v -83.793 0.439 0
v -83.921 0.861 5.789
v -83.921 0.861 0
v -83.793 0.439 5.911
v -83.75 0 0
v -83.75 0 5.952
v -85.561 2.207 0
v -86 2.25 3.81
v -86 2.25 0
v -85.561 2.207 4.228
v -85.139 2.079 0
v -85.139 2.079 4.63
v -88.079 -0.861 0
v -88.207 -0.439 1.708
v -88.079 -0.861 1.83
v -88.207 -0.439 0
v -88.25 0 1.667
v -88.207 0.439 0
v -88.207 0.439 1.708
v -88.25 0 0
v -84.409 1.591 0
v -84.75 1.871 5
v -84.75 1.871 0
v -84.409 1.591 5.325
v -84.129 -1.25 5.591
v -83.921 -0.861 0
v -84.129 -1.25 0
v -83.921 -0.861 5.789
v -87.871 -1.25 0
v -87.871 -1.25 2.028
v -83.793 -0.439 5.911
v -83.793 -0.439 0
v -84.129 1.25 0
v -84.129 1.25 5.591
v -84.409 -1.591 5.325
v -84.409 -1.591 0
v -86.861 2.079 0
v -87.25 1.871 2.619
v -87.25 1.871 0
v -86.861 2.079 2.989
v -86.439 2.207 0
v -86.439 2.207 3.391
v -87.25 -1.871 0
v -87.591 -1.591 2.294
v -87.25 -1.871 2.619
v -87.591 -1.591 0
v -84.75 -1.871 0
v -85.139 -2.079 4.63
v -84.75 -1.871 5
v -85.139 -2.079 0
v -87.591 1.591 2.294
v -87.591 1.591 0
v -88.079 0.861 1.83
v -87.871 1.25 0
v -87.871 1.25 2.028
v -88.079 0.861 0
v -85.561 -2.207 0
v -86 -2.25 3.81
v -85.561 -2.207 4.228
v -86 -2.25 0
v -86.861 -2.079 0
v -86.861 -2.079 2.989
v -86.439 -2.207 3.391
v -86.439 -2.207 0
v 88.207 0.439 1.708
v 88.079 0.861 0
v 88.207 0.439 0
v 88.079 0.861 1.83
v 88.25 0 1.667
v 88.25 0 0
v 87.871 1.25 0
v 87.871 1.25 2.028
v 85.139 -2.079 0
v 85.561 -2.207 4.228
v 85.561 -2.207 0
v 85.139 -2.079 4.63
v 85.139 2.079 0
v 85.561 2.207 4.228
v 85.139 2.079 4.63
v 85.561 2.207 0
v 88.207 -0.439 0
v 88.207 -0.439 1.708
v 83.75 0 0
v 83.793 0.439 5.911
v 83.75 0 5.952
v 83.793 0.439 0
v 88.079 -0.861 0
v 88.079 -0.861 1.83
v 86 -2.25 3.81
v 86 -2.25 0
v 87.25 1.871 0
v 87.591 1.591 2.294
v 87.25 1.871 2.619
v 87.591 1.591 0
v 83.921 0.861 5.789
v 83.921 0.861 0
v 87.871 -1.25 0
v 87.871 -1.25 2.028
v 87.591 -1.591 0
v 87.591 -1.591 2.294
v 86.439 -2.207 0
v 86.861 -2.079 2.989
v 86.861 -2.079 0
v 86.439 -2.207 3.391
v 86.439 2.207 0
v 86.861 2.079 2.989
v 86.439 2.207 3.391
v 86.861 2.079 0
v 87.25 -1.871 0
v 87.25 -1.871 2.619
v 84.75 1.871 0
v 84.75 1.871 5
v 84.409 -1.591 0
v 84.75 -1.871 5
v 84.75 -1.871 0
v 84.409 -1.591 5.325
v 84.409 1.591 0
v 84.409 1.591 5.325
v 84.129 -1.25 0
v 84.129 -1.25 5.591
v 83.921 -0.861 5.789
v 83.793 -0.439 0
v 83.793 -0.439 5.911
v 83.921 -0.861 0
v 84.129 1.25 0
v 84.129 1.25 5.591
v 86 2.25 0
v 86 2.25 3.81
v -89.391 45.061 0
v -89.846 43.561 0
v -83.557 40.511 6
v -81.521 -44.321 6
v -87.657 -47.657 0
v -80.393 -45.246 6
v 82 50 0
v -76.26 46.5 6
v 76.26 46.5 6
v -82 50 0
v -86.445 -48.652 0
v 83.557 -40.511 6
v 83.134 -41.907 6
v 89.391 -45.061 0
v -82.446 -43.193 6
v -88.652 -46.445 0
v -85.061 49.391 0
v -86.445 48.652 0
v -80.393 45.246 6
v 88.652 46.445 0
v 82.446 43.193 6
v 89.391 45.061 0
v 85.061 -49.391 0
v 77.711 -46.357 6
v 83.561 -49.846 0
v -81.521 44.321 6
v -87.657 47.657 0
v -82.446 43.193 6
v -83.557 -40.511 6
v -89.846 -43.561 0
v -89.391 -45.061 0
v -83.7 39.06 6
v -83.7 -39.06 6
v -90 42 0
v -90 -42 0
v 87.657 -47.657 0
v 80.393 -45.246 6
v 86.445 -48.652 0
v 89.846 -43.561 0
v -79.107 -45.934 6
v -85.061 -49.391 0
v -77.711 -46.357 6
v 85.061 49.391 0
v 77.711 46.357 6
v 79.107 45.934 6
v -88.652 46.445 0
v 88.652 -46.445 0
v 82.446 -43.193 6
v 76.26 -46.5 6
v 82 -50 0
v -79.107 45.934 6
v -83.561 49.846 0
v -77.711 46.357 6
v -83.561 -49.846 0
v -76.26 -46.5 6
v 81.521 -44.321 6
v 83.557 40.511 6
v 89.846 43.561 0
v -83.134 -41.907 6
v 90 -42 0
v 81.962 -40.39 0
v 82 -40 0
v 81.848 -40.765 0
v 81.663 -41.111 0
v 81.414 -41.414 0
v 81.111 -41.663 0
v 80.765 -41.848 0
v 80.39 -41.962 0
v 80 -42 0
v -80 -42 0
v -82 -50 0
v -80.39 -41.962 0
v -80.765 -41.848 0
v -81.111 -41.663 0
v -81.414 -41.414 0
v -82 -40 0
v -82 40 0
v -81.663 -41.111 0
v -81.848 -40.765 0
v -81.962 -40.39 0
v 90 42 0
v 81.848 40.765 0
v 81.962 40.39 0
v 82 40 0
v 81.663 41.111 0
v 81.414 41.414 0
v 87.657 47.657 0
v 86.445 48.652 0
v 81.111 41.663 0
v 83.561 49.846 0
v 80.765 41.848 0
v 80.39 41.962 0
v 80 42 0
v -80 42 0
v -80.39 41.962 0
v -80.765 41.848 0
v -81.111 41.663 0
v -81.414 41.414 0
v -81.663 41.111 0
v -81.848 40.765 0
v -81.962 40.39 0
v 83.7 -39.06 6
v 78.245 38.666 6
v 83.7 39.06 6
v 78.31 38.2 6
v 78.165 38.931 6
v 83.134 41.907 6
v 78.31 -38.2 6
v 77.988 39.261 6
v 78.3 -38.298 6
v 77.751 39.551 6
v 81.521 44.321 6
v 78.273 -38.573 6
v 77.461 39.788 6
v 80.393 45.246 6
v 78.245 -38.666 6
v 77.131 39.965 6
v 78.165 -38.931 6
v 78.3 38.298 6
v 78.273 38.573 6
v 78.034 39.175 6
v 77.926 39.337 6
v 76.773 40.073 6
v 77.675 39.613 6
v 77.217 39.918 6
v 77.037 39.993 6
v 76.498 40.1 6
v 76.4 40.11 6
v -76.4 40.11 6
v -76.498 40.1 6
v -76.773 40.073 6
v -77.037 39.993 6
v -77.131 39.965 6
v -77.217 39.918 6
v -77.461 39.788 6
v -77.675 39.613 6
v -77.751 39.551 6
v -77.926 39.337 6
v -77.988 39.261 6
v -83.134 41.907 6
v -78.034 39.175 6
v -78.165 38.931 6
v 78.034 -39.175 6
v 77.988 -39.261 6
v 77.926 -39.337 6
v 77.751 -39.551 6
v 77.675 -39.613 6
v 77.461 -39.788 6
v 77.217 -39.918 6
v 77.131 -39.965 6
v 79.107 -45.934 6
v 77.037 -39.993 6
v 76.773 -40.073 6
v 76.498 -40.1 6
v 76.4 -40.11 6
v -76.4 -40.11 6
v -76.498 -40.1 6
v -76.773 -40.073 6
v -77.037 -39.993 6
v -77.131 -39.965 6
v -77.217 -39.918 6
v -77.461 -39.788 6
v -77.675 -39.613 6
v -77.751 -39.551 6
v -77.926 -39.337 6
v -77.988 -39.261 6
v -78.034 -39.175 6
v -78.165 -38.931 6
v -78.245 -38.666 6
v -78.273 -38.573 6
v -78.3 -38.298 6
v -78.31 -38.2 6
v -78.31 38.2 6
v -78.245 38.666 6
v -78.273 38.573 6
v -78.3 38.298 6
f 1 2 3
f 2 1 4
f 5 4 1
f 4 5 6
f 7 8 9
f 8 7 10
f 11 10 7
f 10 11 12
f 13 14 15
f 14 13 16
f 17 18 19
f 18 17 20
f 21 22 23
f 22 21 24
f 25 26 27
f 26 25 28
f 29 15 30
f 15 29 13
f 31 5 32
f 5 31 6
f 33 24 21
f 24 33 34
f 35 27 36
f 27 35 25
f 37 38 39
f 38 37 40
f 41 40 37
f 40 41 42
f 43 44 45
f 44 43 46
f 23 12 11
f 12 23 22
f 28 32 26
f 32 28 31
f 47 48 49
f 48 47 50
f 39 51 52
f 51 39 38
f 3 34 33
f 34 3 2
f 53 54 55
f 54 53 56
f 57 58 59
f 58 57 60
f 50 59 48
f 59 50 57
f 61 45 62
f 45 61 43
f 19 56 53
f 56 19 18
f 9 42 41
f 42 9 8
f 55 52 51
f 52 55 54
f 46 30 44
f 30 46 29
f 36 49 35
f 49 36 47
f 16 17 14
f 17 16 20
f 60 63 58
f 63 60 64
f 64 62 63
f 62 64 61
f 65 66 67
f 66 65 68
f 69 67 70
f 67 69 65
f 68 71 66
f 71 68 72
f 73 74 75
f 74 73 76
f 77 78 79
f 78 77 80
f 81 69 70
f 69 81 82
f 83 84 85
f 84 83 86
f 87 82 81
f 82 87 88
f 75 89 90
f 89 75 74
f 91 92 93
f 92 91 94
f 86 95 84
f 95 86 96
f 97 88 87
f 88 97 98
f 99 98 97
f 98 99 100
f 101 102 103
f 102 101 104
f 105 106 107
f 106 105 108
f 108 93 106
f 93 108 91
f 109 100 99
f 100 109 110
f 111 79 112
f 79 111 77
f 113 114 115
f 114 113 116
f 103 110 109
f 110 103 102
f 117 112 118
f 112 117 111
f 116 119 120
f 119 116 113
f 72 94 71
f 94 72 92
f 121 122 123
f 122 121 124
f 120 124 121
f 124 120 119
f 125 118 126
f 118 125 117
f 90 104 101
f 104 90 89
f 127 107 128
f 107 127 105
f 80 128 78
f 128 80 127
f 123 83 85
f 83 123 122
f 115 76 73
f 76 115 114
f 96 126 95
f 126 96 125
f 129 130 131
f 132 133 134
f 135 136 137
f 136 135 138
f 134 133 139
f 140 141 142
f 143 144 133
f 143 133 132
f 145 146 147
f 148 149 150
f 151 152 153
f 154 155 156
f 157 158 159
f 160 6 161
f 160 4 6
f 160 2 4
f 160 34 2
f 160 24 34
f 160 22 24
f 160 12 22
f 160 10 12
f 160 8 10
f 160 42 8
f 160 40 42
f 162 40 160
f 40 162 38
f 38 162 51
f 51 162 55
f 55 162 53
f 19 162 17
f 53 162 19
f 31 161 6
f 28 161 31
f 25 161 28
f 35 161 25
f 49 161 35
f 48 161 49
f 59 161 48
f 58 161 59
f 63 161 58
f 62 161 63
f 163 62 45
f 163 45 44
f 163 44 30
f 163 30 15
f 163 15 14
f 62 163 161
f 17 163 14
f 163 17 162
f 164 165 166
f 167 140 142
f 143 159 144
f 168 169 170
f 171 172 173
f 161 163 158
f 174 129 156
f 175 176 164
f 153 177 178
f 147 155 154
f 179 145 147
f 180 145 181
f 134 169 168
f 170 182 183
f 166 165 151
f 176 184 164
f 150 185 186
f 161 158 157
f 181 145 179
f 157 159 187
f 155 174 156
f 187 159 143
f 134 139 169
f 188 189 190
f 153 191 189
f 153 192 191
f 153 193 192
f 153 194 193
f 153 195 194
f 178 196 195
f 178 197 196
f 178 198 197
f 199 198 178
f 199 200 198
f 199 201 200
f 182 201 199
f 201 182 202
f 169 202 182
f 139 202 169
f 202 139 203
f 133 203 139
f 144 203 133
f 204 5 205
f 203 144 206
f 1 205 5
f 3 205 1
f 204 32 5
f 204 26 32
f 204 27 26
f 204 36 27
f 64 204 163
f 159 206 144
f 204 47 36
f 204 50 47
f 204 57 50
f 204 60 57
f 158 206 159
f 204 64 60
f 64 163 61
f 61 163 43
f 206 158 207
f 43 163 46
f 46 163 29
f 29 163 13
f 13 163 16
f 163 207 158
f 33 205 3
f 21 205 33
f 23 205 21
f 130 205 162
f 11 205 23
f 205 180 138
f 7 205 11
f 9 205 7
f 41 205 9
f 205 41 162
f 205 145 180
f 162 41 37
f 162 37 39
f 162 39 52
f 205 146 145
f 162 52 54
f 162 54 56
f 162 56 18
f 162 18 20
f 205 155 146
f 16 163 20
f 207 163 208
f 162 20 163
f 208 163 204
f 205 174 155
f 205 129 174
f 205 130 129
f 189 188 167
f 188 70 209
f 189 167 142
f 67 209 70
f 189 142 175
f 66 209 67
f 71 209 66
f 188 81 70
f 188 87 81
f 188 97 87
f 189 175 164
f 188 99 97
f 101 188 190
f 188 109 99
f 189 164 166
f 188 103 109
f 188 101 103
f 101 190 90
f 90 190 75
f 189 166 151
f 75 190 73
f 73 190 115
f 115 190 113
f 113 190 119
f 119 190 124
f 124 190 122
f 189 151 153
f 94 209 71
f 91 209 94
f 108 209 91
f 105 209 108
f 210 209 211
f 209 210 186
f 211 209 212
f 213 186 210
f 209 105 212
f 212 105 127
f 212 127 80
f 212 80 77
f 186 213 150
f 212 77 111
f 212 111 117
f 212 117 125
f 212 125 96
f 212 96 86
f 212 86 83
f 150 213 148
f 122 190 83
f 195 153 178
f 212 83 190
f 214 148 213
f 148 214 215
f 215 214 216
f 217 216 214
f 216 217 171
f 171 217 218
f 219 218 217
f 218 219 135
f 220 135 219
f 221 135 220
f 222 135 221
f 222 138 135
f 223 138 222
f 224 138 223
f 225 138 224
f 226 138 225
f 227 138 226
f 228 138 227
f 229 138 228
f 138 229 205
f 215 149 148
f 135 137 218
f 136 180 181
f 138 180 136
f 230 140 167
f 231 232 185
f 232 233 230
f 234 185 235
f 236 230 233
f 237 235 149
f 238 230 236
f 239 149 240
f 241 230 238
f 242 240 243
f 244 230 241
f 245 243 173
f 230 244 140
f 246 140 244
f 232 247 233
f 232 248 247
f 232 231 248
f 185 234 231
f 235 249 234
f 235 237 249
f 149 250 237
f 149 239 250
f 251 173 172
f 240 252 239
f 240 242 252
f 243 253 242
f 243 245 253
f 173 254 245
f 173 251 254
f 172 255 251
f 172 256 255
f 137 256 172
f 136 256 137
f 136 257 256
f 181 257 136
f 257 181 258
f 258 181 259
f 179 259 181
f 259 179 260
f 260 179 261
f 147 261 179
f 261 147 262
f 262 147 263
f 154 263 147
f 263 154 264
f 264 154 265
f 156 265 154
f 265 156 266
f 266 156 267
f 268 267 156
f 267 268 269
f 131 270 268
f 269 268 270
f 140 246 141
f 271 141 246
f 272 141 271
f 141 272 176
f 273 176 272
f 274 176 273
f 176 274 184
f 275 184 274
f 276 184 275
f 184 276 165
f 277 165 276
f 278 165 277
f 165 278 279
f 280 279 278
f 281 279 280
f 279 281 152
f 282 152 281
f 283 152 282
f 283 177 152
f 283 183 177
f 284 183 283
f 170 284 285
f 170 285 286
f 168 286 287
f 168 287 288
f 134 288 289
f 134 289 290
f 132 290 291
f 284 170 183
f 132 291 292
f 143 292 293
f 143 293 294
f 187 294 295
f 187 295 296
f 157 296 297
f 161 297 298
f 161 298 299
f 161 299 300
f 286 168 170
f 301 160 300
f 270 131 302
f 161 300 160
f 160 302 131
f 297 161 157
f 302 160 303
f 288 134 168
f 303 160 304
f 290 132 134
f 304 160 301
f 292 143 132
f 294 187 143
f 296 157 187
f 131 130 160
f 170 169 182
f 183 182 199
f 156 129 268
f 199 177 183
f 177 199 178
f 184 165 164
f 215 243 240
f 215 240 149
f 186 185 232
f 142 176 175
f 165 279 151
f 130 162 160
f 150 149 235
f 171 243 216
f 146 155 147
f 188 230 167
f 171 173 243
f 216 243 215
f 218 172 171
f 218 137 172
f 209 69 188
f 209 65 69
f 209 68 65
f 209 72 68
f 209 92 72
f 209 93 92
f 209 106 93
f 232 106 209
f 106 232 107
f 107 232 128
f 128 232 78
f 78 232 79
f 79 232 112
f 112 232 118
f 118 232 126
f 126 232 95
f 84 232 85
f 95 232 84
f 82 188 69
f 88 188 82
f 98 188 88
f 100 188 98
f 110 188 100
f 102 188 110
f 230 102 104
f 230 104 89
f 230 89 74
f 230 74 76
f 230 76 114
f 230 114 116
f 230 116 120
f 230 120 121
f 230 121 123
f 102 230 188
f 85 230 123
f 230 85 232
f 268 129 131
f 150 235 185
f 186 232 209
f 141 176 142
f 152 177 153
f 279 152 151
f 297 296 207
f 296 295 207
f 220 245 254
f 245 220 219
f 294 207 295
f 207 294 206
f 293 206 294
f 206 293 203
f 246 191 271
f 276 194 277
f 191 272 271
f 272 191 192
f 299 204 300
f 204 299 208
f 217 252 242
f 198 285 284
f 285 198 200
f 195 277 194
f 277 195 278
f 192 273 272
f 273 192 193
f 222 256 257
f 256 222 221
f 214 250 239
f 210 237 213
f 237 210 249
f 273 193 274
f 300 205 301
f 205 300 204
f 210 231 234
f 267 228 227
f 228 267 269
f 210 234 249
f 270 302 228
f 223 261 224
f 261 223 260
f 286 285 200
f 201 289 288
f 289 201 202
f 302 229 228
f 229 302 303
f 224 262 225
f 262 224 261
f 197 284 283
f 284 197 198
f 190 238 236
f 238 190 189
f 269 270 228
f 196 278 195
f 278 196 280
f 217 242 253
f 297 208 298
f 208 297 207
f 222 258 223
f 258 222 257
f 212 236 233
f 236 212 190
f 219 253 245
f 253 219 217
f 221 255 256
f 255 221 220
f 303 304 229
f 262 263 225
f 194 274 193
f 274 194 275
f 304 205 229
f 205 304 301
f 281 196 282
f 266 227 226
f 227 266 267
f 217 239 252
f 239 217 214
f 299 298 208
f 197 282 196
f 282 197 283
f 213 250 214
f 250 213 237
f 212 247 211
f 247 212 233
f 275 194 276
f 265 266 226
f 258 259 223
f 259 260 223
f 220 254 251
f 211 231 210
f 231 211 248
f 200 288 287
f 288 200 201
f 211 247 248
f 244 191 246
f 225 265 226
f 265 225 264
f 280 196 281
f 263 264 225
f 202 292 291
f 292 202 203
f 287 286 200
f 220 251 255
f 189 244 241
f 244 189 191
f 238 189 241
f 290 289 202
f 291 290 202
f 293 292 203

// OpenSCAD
$fn = 32;

// ----------------------------------------------------------------------
// Display bezel: 180 x 100 mm frame, opening 164x84 mm
// ----------------------------------------------------------------------

// --- parameters (mm) ---
length = 180;             // frame outside length, X
width = 100;              // frame outside width, Y
frame_w = 8;              // frame width
thickness = 6;            // frame thickness
corner_r = 8;             // outside corner radius
chamfer = 0.93;           // outer wall taper
funnel = 0.94;            // inner opening taper
opening_l = 164;          // opening length
opening_w = 84;           // opening width
inner_r = 2;              // opening corner radius
hole_d = 4.5;             // mounting screw clearance
holes_per_side = 1;       // holes per short side
hole_inset = 4;           // hole centre inset from the outside edge

/* rounded-rectangle outlines, generated with loops */
module rounded_ring(l_nom, w_nom, r) {
  hull() {
    for (sx = [-1, 1]) for (sy = [-1, 1])
      translate([sx * (l_nom / 2 - r), sy * (w_nom / 2 - r)]) circle(r = r);
  }
}

difference() {
  /* frame body, drafted so the outer edge is a variable-depth chamfer */
  linear_extrude(height = thickness, scale = chamfer)
    rounded_ring(length, width, corner_r);
  /* viewing opening, drafted the other way for a funnel edge */
  linear_extrude(height = thickness + 2, scale = funnel)
    translate([0, 0, -1]) rounded_ring(opening_l, opening_w, inner_r);
  /* mounting screws through the frame lands */
  for (sx = [-1, 1]) for (i = [1 : holes_per_side])
    translate([sx * (length / 2 - hole_inset),
               (i - (holes_per_side + 1) / 2) * width * 0.5, -1])
      cylinder(h = thickness + 2, d = hole_d);
}
